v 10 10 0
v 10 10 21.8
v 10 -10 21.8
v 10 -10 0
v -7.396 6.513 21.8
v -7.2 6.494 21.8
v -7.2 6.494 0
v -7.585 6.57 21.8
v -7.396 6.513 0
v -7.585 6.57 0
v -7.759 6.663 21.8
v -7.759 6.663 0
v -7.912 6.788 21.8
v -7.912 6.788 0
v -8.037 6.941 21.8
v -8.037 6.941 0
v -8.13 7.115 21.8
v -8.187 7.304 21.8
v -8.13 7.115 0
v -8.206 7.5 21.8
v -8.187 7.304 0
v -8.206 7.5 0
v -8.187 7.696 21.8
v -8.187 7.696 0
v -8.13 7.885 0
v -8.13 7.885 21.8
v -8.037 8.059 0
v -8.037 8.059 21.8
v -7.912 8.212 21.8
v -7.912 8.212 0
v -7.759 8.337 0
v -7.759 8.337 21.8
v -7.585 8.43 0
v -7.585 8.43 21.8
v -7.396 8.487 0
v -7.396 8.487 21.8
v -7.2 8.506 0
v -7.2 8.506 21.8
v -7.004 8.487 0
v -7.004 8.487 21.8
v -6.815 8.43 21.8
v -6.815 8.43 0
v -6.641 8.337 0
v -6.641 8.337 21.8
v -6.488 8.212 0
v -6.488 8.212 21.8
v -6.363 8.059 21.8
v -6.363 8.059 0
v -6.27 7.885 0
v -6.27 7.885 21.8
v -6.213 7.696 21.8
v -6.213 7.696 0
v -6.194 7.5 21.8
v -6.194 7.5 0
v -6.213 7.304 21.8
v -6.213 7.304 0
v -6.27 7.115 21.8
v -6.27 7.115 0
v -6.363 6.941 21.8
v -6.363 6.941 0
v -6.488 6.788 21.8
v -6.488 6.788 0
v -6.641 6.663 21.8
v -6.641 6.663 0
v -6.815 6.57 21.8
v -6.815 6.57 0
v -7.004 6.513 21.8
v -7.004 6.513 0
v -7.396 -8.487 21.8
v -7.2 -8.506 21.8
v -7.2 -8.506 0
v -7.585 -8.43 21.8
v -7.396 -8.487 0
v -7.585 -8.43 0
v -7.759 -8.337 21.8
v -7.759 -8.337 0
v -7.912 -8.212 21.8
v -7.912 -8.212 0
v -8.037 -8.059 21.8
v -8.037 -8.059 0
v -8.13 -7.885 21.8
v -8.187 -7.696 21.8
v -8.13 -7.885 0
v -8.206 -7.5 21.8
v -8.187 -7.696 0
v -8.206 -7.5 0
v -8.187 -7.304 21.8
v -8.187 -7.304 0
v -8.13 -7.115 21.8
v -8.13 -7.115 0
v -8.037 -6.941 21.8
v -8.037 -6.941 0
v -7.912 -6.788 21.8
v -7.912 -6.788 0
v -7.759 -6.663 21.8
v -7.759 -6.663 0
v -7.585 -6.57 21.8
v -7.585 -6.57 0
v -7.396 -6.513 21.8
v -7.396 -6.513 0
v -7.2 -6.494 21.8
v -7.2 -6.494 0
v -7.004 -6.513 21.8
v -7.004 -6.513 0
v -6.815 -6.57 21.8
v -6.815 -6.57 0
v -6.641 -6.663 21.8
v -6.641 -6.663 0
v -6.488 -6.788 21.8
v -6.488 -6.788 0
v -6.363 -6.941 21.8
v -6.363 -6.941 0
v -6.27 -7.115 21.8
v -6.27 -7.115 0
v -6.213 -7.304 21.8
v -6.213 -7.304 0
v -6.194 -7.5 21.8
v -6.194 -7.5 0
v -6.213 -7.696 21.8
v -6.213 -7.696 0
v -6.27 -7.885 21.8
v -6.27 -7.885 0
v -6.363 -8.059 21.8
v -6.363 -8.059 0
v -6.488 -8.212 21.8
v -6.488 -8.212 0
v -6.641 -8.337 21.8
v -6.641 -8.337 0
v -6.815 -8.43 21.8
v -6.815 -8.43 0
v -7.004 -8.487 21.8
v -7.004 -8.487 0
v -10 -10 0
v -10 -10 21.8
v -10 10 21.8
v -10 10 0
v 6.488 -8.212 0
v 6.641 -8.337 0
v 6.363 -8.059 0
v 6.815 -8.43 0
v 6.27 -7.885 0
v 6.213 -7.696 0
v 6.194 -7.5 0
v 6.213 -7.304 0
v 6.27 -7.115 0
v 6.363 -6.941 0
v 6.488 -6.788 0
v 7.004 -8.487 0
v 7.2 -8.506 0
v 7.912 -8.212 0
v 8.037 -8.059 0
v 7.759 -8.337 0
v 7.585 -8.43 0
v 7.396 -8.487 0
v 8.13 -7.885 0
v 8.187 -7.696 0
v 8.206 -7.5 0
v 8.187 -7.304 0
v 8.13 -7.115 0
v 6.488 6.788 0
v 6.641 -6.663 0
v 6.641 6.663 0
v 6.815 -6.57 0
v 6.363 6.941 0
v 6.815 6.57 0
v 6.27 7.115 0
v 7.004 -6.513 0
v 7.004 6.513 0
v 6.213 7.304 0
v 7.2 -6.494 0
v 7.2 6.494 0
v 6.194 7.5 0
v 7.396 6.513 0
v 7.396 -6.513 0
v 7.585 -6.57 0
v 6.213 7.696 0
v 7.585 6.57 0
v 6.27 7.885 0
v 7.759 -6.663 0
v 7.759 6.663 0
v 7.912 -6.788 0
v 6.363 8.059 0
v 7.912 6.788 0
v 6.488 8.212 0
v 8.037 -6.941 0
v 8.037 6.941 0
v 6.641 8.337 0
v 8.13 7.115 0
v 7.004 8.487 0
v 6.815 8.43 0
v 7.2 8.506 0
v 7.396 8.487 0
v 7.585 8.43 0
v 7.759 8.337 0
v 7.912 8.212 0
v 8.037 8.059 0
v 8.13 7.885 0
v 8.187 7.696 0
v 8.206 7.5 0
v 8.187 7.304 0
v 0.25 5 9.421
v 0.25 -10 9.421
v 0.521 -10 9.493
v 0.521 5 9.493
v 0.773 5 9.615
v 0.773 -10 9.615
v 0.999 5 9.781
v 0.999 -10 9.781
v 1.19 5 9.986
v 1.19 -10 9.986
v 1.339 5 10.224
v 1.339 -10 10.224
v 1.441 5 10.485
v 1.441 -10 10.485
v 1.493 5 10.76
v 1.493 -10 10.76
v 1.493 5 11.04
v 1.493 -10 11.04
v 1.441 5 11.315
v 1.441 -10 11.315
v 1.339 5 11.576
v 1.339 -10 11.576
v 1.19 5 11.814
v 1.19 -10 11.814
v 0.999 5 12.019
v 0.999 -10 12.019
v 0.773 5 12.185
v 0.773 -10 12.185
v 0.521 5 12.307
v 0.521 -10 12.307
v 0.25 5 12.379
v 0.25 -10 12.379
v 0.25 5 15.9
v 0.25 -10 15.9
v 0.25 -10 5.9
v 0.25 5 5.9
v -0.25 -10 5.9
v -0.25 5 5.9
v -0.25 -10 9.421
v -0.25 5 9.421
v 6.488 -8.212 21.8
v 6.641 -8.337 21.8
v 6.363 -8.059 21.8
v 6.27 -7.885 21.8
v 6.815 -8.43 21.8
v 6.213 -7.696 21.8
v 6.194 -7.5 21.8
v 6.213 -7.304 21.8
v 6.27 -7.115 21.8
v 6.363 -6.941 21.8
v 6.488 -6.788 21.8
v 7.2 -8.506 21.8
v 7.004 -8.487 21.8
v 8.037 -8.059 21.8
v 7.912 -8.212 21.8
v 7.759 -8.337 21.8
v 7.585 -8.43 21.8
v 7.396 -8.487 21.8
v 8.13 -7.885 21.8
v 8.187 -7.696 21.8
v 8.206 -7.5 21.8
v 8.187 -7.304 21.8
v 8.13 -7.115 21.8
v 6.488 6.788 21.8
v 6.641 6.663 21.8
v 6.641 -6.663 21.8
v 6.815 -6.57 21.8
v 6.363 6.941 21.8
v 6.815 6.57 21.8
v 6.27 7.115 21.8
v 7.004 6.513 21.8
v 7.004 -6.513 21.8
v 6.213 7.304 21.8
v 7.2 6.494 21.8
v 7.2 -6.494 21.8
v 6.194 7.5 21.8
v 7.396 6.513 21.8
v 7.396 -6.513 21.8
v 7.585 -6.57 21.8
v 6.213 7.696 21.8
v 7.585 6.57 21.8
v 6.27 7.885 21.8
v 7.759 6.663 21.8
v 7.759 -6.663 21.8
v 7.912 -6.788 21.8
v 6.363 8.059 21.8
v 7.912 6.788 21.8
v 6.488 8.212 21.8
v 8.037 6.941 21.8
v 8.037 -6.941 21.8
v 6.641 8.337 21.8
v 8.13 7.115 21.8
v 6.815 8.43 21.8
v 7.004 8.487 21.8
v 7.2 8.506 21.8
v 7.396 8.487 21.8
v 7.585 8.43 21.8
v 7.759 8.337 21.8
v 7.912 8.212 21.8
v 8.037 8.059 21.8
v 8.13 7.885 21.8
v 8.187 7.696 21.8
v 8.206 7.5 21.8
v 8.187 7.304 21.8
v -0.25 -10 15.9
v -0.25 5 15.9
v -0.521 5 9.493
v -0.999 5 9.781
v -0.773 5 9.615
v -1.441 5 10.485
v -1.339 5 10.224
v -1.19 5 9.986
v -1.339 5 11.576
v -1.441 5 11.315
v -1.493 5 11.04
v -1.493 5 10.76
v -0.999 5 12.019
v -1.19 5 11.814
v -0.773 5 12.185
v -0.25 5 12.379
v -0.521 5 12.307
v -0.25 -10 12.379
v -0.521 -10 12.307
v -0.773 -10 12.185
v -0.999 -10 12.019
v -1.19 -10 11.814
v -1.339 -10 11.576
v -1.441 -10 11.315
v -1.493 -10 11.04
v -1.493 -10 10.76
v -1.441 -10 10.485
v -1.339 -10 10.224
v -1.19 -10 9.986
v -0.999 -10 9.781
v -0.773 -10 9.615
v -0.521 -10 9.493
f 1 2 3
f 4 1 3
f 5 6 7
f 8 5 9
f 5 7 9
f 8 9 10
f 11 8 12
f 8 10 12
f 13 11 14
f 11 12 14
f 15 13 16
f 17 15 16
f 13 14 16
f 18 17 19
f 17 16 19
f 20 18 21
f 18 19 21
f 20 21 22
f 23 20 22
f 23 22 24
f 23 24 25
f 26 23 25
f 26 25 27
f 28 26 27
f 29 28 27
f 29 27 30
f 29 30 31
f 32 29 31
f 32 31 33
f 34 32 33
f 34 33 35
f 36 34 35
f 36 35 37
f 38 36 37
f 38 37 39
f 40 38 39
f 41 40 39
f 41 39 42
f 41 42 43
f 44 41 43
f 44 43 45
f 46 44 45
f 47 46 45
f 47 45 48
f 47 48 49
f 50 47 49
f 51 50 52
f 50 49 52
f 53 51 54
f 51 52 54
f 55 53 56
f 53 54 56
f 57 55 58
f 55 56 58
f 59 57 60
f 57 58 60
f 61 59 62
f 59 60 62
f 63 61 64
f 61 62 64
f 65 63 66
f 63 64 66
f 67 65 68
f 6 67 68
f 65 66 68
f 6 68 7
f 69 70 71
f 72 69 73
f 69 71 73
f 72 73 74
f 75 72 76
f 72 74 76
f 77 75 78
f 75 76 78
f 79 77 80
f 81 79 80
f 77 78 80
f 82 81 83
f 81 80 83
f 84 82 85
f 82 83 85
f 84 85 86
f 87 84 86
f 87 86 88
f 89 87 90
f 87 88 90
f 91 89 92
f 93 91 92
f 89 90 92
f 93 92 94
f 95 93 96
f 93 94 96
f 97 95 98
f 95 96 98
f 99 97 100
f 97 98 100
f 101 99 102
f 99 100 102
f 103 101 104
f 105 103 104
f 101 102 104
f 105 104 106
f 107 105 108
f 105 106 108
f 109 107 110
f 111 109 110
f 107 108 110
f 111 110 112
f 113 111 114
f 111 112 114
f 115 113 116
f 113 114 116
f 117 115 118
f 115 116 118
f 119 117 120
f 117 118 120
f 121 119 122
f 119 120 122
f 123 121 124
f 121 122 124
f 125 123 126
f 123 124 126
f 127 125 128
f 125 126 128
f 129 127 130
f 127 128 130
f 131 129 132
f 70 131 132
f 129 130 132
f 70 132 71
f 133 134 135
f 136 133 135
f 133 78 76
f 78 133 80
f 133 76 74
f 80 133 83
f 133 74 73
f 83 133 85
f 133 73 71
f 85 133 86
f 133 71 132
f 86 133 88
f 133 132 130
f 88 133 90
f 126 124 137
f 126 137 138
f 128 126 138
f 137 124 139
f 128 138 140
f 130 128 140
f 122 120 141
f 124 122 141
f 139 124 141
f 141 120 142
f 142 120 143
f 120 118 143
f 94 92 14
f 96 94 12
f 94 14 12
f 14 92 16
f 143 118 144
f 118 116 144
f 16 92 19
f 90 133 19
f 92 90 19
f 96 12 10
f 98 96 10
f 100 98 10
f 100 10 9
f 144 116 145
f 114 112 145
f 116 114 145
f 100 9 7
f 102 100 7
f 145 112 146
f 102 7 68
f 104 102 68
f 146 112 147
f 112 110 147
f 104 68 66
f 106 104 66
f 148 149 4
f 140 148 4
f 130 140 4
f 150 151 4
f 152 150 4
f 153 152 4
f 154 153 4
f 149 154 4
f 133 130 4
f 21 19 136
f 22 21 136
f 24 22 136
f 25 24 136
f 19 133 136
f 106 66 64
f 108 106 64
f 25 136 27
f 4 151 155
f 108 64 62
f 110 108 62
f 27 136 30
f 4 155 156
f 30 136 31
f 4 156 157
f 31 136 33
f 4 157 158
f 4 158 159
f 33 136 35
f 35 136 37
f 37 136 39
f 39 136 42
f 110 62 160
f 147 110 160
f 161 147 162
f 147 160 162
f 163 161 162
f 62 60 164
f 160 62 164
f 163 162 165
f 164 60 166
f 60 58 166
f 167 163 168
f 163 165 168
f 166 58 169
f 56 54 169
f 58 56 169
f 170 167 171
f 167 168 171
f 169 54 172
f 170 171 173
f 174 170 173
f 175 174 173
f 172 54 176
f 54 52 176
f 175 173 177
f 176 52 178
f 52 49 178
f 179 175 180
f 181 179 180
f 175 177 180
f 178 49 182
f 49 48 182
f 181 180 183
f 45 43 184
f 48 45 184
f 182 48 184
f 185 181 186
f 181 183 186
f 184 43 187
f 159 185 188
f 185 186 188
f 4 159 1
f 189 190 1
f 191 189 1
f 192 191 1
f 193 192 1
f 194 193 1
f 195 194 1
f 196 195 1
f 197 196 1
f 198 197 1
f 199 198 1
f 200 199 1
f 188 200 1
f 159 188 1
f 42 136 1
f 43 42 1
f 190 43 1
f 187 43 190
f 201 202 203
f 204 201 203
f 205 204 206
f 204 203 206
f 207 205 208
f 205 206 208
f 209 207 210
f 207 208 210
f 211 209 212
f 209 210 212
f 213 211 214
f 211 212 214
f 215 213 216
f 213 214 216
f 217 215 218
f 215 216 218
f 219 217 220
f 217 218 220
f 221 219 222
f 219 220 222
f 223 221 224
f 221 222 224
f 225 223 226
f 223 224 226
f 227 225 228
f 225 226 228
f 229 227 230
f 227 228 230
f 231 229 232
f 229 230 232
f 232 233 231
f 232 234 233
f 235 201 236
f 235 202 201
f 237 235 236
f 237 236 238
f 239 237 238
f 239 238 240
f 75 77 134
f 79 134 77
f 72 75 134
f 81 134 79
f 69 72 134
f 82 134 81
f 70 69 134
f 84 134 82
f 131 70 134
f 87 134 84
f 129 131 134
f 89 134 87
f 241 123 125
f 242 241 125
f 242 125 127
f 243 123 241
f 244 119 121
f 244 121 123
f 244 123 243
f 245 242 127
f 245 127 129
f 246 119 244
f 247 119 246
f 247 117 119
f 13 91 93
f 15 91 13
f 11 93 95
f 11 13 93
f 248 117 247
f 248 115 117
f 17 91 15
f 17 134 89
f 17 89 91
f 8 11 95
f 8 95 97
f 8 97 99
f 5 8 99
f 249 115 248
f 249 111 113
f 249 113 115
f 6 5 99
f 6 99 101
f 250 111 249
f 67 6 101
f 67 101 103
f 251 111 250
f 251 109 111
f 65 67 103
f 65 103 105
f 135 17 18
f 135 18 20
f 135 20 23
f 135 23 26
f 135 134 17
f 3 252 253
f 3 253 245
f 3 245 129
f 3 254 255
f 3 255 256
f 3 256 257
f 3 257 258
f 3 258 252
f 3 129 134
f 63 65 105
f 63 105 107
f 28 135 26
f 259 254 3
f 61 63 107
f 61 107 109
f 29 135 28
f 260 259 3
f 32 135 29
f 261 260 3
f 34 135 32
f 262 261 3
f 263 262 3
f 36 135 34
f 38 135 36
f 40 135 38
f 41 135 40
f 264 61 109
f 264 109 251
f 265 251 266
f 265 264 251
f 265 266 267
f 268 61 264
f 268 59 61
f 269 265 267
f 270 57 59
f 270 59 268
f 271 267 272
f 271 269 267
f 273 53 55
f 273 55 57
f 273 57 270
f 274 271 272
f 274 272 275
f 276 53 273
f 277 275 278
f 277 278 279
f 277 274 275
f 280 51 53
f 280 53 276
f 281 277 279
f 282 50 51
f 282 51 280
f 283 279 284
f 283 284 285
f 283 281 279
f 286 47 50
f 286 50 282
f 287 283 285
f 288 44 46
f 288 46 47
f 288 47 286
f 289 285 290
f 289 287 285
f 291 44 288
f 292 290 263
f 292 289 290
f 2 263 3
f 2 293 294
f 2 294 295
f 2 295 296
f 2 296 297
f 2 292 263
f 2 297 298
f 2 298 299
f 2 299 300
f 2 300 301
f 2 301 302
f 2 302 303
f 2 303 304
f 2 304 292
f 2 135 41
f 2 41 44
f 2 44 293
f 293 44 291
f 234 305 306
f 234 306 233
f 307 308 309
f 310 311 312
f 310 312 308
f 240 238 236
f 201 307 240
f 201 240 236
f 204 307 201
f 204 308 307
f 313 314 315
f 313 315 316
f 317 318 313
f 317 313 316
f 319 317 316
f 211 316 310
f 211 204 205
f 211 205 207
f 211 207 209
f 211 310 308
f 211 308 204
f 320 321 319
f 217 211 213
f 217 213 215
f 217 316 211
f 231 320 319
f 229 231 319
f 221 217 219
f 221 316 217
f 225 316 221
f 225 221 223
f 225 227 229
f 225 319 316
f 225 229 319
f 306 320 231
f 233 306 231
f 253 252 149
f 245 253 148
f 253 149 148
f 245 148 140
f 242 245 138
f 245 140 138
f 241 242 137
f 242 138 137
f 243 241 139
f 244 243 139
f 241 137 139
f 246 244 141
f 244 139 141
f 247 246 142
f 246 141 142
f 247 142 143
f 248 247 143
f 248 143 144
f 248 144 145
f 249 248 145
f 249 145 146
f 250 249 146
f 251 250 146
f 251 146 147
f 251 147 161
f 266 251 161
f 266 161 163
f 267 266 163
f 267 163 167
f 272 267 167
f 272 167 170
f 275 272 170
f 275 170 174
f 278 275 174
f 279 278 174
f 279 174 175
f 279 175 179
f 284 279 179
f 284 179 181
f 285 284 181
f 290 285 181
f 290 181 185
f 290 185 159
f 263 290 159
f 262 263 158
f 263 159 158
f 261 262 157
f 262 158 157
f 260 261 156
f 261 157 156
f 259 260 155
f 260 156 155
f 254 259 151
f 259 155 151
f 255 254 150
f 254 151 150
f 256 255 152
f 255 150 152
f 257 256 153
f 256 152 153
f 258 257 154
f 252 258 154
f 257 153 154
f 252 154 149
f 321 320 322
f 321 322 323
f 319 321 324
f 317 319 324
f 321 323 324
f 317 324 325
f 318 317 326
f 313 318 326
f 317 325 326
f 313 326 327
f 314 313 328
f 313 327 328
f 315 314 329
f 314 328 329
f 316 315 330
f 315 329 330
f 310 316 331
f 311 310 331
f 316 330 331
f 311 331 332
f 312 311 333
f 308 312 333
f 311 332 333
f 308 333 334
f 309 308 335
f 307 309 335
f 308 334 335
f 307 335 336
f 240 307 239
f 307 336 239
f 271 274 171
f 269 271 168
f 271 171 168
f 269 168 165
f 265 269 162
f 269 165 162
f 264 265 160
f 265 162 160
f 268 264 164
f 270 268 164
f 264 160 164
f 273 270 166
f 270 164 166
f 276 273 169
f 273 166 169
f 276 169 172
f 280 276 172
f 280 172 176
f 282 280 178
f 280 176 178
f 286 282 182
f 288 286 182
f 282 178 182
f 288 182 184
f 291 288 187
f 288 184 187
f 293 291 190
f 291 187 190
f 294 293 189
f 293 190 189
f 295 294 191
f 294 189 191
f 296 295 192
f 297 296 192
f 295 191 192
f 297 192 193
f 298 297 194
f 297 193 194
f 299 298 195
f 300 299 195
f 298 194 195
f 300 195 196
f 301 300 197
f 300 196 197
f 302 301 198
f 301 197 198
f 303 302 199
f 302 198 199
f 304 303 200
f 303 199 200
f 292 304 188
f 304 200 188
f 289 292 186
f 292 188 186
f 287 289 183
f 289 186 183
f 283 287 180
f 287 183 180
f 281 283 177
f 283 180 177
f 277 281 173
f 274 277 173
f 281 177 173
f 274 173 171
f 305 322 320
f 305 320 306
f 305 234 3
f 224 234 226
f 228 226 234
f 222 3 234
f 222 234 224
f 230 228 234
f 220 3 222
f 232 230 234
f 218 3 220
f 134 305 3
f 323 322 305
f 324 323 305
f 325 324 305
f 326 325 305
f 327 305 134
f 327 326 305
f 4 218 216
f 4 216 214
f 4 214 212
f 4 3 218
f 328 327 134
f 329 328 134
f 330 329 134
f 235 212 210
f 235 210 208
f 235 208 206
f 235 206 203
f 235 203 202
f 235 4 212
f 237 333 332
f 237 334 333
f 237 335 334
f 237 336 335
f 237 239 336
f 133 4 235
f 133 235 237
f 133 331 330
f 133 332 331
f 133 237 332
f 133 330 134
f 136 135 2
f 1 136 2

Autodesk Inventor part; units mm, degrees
ref_plane "YZ Plane" through (0, 0, 0) normal (1, 0, 0) x (0, 1, 0)
ref_plane "XZ Plane" through (0, 0, 0) normal (0, 1, 0) x (-1, 0, 0)
ref_plane "XY Plane" through (0, 0, 0) normal (0, 0, 1) x (1, 0, 0)
sketch "スケッチ1" plane through (0, 0, 0) normal (0, 0, 1) x (1, 0, 0)
  line L0 (-10, 10) -> (10, 10)
  line L1 (10, 10) -> (10, -10)
  line L2 (10, -10) -> (-10, -10)
  line L3 (-10, -10) -> (-10, 10)
  point P0 (0, 0)
  dimension "d0" = 20
  dimension "d1" = 10
  dimension "d2" = 20
  dimension "d3" = 10
extrude "押し出し1" add sketch "スケッチ1" along normal blind 21.8
sketch "スケッチ2" plane through (0, 0, 21.8) normal (0, 0, 1) x (1, 0, 0)
  point P0 (0, 0)
  point P1 (-7.2, 7.5)
  point P2 (-7.2, -7.5)
  point P3 (7.2, -7.5)
  point P4 (7.2, 7.5)
  dimension "d6" = 14.4
  dimension "d7" = 14.4
  dimension "d8" = 15
  dimension "d9" = 15
  dimension "d10" = 7.2
  dimension "d11" = 7.2
  dimension "d12" = 7.5
  dimension "d13" = 7.5
hole "Hole1" at (-7.2, 7.5, 21.8) at (-7.2, -7.5, 21.8) at (7.2, -7.5, 21.8) at (7.2, 7.5, 21.8) direction (0, 0, -1) diameter 2.013 end through all thread size "M2.5x0.45" class "6H" standard "ISO Metric profile"
sketch "スケッチ3" plane through (-10, -10, 0) normal (0, -1, 0) x (1, 0, 0)
  line L0 (20, 21.8) -> (0, 21.8) projected
  line L1 (20, 0) -> (20, 21.8) projected
  circle A0 centre (10, 10.9) radius 1.5
  line L2 (9.75, 15.9) -> (10.25, 15.9)
  line L3 (10.25, 15.9) -> (10.25, 5.9)
  line L4 (10.25, 5.9) -> (9.75, 5.9)
  line L5 (9.75, 5.9) -> (9.75, 15.9)
  point P0 (10, 0)
  dimension "d21" = 3
  dimension "d22" = 10.9
  dimension "d23" = 10
  dimension "d24" = 10
  dimension "d25" = 0.5
  dimension "d26" = 0.25
  dimension "d27" = 5
extrude "押し出し2" cut sketch "スケッチ3" against normal blind 15
equation "\"d1\" = 0.5 * d0"
equation "\"d3\" = 0.5 * d2"
equation "\"d7\" = d6"
equation "\"d9\" = d8"
equation "\"d10\" = 0.5 * d6"
equation "\"d11\" = d10"
equation "\"d12\" = 0.5 * d8"
equation "\"d13\" = d12"
equation "\"d26\" = 0.5 * d25"
equation "\"d27\" = 0.5 * d24"
properties part number "JointD1"
